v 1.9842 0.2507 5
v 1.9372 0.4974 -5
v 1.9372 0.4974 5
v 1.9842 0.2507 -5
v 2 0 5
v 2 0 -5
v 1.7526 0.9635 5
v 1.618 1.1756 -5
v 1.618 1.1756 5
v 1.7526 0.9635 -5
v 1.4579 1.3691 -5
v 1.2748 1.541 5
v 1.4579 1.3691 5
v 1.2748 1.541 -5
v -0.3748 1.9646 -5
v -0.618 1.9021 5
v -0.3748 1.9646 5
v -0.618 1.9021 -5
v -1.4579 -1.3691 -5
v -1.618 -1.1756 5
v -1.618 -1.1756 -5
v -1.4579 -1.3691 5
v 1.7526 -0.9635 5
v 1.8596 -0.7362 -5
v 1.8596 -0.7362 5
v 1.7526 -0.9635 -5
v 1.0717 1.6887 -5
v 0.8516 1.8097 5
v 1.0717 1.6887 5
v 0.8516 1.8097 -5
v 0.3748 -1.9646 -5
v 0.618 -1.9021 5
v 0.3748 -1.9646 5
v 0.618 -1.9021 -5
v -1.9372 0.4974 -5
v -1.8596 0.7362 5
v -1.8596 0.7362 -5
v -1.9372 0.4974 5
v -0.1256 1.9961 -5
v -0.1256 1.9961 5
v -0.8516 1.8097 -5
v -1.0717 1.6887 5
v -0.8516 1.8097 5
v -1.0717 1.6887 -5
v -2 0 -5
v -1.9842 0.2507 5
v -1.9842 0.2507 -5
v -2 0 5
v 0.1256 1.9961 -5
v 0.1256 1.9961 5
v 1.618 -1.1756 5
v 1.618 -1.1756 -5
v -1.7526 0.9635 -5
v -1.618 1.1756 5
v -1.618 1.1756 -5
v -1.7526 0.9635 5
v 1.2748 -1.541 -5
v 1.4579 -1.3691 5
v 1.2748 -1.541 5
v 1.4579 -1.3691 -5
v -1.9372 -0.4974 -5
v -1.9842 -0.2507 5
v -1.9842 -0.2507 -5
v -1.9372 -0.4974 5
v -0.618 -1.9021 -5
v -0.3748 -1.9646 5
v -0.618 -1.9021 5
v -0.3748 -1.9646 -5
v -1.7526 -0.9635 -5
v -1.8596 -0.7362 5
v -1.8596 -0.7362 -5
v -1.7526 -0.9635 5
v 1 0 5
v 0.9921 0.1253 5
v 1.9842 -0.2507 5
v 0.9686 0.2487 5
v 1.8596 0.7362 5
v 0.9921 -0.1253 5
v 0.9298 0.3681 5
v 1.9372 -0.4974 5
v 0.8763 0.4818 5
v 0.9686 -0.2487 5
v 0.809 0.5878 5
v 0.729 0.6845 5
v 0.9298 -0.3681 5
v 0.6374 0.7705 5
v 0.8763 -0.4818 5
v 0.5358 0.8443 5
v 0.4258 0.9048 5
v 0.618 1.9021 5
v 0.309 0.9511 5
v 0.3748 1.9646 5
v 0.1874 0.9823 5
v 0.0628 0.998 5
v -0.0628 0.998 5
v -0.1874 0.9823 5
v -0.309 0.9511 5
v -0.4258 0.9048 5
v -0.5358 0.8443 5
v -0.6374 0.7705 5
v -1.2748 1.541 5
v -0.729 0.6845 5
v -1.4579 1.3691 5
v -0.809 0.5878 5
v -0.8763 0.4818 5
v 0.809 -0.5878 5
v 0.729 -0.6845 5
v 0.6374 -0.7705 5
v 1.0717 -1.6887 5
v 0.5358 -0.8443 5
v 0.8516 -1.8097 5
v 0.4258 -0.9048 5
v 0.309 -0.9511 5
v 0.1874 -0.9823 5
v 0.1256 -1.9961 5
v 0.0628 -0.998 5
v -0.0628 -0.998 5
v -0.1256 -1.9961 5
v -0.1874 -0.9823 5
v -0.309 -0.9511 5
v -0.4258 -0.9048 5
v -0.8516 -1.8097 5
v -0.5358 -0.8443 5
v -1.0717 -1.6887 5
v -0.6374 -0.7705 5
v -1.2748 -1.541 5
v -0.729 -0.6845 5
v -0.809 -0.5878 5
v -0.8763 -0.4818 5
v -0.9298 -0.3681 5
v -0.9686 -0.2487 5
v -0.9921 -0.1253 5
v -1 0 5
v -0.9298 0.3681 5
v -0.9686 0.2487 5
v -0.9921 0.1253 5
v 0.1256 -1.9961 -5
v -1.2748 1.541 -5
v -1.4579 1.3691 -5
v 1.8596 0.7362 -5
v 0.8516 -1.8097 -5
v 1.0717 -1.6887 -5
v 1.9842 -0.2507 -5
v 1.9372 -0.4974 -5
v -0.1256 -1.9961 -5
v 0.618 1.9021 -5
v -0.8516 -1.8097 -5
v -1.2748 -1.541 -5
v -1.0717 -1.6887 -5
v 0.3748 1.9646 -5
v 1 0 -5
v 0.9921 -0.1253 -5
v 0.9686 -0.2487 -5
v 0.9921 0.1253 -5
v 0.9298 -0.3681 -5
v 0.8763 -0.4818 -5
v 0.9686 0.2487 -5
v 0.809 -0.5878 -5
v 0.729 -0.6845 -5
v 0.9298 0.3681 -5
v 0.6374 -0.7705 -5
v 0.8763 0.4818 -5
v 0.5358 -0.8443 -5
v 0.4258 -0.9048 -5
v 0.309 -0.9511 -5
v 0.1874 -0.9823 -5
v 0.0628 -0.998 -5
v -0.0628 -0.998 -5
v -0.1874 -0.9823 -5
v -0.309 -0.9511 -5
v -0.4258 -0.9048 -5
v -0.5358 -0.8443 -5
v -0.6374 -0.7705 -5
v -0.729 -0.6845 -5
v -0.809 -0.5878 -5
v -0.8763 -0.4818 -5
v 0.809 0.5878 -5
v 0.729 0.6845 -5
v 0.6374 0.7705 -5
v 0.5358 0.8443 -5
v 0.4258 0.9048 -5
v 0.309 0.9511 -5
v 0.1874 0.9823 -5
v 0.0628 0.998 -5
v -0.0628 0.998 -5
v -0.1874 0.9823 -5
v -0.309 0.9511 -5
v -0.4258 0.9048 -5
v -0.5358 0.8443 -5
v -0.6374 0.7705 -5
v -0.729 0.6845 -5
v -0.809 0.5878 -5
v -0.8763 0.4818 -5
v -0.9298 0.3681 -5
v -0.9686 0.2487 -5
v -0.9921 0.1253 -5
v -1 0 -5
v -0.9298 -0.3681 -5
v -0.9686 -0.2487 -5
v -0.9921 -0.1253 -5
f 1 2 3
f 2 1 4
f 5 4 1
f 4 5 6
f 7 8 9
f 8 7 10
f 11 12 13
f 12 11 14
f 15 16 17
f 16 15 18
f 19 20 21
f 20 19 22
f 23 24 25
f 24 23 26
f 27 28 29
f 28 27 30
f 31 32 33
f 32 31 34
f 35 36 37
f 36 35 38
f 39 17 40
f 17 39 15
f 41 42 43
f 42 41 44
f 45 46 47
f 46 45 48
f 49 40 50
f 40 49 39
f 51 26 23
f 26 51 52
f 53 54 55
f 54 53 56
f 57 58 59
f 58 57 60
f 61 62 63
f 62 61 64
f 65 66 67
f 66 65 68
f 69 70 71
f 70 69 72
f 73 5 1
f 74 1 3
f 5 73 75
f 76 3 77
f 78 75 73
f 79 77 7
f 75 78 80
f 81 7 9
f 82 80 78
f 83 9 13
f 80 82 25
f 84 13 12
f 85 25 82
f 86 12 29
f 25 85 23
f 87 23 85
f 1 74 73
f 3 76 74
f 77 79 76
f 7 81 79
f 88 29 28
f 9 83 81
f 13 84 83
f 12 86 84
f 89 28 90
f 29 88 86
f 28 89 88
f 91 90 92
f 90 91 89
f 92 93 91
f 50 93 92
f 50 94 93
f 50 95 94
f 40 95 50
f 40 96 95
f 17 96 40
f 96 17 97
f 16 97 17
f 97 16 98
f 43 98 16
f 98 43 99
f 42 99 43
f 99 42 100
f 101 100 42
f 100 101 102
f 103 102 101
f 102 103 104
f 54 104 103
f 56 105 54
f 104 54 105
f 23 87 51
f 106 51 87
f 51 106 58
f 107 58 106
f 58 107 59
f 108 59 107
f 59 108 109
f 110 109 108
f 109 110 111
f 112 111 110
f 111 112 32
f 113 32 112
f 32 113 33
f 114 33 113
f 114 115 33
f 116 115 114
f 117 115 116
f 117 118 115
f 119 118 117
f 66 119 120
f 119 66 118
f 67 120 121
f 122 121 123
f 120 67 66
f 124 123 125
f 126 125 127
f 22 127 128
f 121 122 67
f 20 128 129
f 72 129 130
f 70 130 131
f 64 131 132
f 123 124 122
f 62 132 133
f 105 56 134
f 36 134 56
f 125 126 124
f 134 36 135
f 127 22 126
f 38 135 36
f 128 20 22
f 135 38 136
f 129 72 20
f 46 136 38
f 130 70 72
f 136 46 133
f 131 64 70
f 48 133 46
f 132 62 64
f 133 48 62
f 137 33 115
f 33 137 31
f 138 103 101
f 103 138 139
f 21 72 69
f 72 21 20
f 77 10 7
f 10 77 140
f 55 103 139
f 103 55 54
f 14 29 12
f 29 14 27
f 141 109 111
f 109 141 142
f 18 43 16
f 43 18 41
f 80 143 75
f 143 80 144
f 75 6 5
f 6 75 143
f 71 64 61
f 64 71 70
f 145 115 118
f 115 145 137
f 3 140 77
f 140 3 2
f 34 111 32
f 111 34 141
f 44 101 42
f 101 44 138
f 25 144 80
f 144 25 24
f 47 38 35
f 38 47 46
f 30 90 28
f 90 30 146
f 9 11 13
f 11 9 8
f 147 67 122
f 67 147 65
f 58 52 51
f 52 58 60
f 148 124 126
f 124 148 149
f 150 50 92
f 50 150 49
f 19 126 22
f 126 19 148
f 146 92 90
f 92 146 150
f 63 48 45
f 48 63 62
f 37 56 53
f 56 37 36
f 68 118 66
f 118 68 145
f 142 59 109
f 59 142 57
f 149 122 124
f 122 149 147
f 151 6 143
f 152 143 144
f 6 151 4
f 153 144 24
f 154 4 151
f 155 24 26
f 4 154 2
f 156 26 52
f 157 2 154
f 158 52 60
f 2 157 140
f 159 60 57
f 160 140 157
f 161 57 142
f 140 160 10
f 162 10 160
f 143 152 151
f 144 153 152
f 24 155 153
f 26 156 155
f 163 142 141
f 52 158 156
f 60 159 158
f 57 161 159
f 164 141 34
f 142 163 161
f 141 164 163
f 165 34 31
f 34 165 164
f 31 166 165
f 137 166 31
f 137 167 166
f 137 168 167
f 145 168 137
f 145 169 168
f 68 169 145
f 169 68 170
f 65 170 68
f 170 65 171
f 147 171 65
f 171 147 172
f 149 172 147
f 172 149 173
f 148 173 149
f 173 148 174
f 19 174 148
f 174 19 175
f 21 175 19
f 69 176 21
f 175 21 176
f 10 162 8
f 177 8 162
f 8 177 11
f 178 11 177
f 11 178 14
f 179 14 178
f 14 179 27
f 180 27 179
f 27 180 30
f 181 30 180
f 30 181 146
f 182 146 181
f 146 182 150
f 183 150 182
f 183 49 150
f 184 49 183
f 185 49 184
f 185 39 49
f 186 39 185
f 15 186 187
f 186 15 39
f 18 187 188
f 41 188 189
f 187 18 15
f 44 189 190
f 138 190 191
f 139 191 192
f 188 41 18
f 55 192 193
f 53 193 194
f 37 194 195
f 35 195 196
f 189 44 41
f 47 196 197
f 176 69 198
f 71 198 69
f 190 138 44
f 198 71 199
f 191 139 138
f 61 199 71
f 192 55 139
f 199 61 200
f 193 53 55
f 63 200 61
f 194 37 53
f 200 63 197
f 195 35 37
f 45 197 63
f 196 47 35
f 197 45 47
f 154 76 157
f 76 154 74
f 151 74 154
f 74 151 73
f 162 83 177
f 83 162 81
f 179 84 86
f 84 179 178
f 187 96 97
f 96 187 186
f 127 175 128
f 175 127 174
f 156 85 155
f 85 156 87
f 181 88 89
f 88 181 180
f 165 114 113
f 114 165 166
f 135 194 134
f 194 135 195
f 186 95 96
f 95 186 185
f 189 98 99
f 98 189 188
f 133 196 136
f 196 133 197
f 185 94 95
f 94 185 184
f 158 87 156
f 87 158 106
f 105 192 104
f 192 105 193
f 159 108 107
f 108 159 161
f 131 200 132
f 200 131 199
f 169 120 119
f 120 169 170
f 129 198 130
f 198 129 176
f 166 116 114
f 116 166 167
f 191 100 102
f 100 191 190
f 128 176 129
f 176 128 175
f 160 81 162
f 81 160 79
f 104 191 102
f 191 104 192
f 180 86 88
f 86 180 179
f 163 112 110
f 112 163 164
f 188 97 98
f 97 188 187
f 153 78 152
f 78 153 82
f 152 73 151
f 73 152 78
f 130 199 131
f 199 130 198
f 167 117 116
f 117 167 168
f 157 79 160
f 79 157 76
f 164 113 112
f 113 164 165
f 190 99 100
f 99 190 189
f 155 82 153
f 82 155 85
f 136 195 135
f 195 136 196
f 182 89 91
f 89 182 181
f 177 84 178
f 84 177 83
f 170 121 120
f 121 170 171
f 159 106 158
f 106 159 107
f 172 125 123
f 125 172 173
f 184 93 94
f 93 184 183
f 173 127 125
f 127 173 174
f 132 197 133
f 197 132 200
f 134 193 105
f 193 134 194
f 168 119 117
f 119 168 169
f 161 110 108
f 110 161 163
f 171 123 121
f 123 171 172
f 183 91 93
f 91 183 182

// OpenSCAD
$fn = 50;


difference() {
	union() {
		translate(v = [0, 0, -5.0000000000]) {
			cylinder(h = 10, r = 2.0000000000);
		}
	}
	union() {
		translate(v = [0, 0, -100.0000000000]) {
			cylinder(h = 200, r = 1.0000000000);
		}
	}
}
